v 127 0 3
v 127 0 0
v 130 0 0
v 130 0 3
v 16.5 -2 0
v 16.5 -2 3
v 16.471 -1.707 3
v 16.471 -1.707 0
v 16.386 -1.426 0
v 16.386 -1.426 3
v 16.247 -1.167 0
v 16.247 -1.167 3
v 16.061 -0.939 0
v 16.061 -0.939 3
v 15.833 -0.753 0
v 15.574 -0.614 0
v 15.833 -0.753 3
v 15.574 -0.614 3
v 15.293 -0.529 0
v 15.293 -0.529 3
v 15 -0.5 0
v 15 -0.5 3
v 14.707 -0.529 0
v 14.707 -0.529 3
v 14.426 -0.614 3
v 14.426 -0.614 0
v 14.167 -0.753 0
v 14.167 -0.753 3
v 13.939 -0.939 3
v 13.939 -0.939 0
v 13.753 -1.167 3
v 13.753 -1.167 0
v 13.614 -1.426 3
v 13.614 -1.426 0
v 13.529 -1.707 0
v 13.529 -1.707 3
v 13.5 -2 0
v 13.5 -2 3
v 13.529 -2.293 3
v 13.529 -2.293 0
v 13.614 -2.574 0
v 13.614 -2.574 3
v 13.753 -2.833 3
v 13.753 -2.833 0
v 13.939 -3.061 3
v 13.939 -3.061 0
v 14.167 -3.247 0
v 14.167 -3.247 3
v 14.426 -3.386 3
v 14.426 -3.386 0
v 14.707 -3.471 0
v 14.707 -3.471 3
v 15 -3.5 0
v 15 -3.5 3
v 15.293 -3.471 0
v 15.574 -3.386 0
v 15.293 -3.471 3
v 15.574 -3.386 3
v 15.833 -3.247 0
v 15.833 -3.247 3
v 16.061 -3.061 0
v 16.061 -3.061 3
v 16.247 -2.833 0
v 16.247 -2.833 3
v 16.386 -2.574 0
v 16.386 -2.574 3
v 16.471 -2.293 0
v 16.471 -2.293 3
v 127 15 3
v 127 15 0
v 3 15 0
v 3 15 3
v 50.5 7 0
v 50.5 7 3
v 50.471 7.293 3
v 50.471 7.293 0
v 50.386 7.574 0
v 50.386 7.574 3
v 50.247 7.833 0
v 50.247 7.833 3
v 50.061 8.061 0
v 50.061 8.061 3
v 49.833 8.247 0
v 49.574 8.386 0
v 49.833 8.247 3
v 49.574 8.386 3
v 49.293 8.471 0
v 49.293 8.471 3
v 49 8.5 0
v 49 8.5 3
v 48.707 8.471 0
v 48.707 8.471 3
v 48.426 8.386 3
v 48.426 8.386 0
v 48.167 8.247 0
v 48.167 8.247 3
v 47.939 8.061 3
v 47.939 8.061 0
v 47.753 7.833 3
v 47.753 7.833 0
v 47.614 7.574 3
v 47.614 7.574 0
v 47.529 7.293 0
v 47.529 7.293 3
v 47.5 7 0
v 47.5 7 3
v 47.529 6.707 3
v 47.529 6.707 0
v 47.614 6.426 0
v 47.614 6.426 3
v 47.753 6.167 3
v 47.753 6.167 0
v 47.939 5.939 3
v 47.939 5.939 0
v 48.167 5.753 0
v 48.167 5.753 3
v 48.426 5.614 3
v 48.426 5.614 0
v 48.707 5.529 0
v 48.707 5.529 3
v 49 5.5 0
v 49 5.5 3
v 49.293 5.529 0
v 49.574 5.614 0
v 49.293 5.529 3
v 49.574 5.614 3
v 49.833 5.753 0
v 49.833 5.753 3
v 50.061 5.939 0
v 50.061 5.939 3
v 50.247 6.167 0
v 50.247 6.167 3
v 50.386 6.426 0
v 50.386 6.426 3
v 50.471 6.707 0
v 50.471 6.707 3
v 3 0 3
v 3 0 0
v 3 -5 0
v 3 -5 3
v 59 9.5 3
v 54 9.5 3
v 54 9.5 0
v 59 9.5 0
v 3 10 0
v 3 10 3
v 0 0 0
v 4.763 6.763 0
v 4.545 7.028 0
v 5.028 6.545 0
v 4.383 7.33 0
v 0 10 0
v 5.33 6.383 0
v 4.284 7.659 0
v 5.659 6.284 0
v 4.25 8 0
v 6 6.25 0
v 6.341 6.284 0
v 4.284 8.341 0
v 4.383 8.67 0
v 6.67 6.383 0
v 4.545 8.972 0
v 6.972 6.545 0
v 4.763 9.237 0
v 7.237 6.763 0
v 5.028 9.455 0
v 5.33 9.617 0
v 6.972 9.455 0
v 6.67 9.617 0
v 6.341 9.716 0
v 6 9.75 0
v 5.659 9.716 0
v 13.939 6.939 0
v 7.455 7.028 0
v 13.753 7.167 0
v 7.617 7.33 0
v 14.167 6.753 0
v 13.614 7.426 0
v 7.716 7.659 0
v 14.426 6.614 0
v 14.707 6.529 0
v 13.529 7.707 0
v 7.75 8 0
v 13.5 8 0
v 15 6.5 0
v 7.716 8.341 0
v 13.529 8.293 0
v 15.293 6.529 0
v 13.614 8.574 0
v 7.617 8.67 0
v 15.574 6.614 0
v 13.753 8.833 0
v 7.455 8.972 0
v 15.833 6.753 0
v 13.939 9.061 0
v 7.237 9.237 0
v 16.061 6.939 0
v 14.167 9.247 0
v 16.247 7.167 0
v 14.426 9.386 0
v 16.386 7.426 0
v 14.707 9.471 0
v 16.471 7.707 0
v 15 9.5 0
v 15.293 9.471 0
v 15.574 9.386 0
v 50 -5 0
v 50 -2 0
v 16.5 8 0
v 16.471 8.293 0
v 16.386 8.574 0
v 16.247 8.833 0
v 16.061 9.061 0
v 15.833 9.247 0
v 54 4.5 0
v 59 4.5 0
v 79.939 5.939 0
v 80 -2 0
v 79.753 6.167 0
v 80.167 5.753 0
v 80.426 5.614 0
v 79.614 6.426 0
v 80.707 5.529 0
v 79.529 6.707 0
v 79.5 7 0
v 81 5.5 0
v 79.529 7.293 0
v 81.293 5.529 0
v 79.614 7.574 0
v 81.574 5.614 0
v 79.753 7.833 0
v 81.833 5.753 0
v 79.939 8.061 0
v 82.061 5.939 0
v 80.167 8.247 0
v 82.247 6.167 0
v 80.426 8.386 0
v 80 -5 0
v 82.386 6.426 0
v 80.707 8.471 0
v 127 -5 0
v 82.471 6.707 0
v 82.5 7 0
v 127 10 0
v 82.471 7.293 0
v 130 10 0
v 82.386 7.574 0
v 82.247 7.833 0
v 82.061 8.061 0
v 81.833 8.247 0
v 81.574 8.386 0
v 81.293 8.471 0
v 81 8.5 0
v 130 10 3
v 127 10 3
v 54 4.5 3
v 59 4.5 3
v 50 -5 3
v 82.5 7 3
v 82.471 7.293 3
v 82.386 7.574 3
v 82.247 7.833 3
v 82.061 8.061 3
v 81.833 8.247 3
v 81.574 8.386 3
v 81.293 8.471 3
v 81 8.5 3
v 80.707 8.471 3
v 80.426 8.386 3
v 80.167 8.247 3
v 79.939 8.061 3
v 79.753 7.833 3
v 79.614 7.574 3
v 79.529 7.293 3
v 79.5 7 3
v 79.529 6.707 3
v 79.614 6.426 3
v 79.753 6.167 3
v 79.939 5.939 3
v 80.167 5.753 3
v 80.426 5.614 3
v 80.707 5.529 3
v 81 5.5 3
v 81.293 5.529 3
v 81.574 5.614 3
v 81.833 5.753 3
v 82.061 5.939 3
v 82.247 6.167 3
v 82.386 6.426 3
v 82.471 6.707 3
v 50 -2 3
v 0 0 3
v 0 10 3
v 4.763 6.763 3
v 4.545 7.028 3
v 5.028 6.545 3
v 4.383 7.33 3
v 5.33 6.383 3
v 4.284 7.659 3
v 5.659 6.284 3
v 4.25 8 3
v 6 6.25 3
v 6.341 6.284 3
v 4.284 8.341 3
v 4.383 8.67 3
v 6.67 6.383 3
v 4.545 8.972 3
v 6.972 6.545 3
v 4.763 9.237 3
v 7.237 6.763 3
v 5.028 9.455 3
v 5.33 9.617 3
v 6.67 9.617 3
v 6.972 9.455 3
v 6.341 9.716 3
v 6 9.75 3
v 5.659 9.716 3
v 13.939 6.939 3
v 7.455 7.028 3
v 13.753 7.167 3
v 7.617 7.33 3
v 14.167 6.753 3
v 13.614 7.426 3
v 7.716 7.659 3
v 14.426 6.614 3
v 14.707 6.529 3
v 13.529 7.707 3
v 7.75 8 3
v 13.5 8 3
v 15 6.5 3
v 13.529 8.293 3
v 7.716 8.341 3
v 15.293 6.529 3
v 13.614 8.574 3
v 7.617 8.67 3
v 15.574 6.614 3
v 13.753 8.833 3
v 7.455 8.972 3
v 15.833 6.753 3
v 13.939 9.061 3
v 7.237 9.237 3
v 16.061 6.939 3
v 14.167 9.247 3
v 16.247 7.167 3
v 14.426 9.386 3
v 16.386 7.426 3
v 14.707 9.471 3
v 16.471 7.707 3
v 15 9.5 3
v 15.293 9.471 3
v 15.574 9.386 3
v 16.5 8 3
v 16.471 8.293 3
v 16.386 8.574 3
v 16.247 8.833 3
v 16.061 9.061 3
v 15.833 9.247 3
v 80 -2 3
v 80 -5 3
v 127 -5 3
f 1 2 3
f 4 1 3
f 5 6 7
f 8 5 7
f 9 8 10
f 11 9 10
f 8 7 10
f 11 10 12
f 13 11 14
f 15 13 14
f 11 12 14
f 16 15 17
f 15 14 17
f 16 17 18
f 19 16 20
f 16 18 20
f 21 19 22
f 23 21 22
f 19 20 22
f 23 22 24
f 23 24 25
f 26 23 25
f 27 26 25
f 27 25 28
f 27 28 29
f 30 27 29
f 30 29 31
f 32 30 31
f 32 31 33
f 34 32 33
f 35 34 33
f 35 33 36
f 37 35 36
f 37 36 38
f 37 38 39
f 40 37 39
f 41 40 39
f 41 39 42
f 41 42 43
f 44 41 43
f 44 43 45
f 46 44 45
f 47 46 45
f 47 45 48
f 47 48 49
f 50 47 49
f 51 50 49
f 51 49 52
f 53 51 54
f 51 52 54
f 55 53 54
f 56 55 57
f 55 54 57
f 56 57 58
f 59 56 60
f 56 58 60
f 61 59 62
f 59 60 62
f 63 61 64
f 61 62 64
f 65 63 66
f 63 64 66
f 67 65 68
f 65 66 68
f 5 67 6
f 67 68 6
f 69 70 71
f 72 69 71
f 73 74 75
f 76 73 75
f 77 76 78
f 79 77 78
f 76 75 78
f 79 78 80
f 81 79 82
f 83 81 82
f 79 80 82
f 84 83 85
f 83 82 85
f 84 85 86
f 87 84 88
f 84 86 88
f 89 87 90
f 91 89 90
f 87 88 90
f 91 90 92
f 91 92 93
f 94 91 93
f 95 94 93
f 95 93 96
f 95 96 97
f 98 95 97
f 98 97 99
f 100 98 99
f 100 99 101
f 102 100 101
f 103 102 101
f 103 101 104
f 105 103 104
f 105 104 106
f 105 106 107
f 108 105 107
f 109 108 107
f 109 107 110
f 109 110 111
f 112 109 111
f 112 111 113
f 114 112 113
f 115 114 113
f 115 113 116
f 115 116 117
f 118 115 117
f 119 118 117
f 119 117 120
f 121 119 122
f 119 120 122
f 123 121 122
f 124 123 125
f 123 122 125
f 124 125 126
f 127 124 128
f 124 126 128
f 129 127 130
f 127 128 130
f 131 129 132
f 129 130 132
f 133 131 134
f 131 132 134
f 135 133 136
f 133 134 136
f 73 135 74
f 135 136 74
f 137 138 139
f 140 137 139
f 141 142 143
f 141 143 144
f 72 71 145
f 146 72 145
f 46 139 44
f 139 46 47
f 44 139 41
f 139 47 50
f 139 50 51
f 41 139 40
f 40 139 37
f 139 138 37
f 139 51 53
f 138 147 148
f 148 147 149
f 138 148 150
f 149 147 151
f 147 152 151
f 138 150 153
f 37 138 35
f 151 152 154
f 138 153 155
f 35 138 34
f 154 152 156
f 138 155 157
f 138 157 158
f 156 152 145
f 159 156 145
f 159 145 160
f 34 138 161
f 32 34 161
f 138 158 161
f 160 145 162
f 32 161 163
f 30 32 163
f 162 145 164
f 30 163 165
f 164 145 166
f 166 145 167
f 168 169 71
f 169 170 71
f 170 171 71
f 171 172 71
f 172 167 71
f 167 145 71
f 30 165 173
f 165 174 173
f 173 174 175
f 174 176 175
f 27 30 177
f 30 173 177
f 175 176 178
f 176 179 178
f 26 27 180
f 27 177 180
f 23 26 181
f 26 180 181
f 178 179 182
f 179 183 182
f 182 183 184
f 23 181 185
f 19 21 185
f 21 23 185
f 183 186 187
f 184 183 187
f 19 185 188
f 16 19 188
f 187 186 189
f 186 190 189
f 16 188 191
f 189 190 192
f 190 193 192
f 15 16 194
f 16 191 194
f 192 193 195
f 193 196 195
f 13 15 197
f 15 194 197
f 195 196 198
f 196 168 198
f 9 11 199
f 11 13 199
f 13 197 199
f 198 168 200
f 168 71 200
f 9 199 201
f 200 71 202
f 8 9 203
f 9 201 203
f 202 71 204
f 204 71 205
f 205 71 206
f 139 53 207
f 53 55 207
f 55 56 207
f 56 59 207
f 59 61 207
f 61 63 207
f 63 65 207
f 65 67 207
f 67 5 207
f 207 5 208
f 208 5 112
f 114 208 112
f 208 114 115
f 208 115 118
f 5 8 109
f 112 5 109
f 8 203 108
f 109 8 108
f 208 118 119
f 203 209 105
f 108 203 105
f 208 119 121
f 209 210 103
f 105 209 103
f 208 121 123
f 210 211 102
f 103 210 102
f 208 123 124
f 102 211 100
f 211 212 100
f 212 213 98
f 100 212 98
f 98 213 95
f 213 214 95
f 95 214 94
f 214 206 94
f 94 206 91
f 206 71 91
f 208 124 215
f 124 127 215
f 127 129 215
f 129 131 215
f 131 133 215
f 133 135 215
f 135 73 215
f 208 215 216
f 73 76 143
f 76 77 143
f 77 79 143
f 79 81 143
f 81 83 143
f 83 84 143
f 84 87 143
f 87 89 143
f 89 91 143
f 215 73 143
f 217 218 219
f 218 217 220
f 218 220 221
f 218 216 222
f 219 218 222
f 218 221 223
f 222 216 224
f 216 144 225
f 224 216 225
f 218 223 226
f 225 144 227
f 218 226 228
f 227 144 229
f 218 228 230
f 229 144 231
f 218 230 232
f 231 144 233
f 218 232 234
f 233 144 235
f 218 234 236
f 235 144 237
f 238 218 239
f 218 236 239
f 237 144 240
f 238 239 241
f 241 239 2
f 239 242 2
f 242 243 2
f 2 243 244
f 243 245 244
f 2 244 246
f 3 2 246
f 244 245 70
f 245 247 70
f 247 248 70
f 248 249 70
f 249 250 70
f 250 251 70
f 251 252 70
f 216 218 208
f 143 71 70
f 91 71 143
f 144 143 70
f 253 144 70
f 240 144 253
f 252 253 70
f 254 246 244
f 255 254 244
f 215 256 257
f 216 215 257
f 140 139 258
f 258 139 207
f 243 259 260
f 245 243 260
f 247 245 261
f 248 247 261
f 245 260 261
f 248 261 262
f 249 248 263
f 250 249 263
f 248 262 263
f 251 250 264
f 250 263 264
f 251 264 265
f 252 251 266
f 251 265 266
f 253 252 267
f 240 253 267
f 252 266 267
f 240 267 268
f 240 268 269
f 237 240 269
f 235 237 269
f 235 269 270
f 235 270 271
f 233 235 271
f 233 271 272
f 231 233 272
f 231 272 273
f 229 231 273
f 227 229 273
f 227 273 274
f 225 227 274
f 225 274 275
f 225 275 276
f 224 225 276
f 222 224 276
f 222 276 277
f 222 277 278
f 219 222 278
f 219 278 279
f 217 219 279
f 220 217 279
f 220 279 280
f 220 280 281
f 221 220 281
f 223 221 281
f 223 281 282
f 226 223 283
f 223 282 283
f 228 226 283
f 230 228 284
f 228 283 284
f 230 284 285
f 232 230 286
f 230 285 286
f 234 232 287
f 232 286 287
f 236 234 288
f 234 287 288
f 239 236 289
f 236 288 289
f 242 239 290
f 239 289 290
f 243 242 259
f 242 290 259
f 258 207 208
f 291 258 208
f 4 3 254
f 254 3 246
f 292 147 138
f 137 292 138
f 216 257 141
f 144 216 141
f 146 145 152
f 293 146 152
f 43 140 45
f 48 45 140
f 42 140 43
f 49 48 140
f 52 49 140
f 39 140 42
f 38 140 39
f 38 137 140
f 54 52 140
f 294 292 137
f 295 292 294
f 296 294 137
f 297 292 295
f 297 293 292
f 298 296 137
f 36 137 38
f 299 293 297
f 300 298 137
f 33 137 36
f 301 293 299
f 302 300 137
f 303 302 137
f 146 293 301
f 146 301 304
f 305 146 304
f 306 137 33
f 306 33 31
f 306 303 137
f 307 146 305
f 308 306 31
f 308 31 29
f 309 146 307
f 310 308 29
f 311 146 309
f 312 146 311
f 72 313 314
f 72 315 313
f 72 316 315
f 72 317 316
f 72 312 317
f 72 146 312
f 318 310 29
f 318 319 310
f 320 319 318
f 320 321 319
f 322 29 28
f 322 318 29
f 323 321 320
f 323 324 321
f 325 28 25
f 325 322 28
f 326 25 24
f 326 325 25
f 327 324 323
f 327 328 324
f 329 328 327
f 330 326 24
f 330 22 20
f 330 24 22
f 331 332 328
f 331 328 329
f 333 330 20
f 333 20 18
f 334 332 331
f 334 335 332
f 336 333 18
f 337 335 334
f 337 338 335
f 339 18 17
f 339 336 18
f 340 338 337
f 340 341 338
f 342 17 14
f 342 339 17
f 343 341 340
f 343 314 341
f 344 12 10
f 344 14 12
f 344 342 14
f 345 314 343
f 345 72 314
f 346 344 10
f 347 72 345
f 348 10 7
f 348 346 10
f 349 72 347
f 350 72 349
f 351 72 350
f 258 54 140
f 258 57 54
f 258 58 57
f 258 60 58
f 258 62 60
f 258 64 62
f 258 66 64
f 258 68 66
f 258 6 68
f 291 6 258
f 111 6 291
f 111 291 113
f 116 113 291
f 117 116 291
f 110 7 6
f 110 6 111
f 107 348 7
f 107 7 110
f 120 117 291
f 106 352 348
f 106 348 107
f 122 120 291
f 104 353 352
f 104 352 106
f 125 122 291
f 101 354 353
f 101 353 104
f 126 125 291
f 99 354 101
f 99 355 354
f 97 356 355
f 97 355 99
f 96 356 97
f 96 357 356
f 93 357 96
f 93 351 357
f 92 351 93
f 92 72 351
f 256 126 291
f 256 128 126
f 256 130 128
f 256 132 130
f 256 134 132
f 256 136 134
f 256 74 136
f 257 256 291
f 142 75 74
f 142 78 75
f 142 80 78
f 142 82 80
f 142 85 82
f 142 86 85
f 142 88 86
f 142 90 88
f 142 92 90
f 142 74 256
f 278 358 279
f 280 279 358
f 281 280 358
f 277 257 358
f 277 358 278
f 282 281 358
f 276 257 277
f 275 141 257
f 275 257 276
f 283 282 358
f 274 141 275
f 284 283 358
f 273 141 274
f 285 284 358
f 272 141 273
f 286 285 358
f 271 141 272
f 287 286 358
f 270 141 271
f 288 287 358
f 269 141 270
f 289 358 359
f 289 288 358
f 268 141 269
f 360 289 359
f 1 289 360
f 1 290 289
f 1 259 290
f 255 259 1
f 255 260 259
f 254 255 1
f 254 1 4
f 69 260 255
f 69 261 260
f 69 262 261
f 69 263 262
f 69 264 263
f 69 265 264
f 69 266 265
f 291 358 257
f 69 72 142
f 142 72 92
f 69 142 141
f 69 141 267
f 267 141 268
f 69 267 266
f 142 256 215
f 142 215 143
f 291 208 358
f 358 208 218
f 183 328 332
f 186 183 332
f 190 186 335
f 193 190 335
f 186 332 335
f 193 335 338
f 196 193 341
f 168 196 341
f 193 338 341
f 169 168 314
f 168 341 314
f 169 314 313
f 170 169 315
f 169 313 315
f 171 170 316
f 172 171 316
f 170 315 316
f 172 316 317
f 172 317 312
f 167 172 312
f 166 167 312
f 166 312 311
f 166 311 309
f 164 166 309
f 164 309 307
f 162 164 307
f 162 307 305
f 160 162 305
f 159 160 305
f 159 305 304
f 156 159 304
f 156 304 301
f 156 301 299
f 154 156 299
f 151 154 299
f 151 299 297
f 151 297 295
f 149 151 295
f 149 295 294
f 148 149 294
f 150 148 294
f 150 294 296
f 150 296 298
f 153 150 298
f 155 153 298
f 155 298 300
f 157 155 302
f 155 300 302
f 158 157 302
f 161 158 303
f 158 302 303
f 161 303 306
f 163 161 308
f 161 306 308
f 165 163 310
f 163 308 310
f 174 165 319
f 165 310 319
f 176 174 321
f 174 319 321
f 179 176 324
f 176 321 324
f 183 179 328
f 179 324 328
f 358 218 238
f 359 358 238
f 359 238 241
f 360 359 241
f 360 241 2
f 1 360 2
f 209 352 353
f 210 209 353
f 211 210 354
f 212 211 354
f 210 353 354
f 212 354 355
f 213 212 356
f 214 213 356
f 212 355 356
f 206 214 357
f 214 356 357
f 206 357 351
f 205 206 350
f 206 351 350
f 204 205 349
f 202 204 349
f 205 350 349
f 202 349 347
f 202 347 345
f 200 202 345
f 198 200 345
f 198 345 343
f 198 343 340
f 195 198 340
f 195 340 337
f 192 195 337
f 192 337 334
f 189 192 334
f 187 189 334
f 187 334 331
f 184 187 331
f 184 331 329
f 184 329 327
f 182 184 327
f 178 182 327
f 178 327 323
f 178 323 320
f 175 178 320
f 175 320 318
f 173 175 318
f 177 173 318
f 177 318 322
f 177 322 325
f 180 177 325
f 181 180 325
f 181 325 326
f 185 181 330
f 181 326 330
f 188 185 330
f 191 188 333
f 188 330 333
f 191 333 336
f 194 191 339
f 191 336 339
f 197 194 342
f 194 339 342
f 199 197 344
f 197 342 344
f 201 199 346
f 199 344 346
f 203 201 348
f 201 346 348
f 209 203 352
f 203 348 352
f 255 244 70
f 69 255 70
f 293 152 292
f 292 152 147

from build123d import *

# Parameters (mm, degrees)
BOSS_EXTRUDE1_DEPTH = 3
SKETCH2_R           = 1.5
SKETCH2_R_2         = 1.75
CUT_EXTRUDE1_DEPTH  = 131.896905999
SKETCH3_R           = 1.5
SKETCH3_W           = 5
SKETCH3_H           = 5
CUT_EXTRUDE2_DEPTH  = 131.896905999


with BuildPart() as part:
    # Sketch1 → Boss-Extrude1 (new body)
    with BuildSketch(Plane.XY):
        Polygon((0, 0), (3, 0), (3, -5), (50, -5), (50, -2), (80, -2), (80, -5), (127, -5), (127, 0), (130, 0), (130, 10), (127, 10), (127, 15), (3, 15), (3, 10), (0, 10), align=None)
    extrude(amount=BOSS_EXTRUDE1_DEPTH)

    # Sketch2 → Cut-Extrude1 (cut, through all)
    with BuildSketch(Plane.XY.offset(3)):
        with Locations((15, 8)):
            Circle(SKETCH2_R)
        with Locations((15, -2)):
            Circle(SKETCH2_R)
        with Locations((6, 8)):
            Circle(SKETCH2_R_2)
    extrude(amount=-CUT_EXTRUDE1_DEPTH, mode=Mode.SUBTRACT)

    # Sketch3 → Cut-Extrude2 (cut, through all)
    with BuildSketch(Plane.XY.offset(3)):
        with Locations((49, 7)):
            Circle(SKETCH3_R)
        with Locations((81, 7)):
            Circle(SKETCH3_R)
        with Locations((56.5, 7)):
            Rectangle(SKETCH3_W, SKETCH3_H)
    extrude(amount=-CUT_EXTRUDE2_DEPTH, mode=Mode.SUBTRACT)


solid = part.part
